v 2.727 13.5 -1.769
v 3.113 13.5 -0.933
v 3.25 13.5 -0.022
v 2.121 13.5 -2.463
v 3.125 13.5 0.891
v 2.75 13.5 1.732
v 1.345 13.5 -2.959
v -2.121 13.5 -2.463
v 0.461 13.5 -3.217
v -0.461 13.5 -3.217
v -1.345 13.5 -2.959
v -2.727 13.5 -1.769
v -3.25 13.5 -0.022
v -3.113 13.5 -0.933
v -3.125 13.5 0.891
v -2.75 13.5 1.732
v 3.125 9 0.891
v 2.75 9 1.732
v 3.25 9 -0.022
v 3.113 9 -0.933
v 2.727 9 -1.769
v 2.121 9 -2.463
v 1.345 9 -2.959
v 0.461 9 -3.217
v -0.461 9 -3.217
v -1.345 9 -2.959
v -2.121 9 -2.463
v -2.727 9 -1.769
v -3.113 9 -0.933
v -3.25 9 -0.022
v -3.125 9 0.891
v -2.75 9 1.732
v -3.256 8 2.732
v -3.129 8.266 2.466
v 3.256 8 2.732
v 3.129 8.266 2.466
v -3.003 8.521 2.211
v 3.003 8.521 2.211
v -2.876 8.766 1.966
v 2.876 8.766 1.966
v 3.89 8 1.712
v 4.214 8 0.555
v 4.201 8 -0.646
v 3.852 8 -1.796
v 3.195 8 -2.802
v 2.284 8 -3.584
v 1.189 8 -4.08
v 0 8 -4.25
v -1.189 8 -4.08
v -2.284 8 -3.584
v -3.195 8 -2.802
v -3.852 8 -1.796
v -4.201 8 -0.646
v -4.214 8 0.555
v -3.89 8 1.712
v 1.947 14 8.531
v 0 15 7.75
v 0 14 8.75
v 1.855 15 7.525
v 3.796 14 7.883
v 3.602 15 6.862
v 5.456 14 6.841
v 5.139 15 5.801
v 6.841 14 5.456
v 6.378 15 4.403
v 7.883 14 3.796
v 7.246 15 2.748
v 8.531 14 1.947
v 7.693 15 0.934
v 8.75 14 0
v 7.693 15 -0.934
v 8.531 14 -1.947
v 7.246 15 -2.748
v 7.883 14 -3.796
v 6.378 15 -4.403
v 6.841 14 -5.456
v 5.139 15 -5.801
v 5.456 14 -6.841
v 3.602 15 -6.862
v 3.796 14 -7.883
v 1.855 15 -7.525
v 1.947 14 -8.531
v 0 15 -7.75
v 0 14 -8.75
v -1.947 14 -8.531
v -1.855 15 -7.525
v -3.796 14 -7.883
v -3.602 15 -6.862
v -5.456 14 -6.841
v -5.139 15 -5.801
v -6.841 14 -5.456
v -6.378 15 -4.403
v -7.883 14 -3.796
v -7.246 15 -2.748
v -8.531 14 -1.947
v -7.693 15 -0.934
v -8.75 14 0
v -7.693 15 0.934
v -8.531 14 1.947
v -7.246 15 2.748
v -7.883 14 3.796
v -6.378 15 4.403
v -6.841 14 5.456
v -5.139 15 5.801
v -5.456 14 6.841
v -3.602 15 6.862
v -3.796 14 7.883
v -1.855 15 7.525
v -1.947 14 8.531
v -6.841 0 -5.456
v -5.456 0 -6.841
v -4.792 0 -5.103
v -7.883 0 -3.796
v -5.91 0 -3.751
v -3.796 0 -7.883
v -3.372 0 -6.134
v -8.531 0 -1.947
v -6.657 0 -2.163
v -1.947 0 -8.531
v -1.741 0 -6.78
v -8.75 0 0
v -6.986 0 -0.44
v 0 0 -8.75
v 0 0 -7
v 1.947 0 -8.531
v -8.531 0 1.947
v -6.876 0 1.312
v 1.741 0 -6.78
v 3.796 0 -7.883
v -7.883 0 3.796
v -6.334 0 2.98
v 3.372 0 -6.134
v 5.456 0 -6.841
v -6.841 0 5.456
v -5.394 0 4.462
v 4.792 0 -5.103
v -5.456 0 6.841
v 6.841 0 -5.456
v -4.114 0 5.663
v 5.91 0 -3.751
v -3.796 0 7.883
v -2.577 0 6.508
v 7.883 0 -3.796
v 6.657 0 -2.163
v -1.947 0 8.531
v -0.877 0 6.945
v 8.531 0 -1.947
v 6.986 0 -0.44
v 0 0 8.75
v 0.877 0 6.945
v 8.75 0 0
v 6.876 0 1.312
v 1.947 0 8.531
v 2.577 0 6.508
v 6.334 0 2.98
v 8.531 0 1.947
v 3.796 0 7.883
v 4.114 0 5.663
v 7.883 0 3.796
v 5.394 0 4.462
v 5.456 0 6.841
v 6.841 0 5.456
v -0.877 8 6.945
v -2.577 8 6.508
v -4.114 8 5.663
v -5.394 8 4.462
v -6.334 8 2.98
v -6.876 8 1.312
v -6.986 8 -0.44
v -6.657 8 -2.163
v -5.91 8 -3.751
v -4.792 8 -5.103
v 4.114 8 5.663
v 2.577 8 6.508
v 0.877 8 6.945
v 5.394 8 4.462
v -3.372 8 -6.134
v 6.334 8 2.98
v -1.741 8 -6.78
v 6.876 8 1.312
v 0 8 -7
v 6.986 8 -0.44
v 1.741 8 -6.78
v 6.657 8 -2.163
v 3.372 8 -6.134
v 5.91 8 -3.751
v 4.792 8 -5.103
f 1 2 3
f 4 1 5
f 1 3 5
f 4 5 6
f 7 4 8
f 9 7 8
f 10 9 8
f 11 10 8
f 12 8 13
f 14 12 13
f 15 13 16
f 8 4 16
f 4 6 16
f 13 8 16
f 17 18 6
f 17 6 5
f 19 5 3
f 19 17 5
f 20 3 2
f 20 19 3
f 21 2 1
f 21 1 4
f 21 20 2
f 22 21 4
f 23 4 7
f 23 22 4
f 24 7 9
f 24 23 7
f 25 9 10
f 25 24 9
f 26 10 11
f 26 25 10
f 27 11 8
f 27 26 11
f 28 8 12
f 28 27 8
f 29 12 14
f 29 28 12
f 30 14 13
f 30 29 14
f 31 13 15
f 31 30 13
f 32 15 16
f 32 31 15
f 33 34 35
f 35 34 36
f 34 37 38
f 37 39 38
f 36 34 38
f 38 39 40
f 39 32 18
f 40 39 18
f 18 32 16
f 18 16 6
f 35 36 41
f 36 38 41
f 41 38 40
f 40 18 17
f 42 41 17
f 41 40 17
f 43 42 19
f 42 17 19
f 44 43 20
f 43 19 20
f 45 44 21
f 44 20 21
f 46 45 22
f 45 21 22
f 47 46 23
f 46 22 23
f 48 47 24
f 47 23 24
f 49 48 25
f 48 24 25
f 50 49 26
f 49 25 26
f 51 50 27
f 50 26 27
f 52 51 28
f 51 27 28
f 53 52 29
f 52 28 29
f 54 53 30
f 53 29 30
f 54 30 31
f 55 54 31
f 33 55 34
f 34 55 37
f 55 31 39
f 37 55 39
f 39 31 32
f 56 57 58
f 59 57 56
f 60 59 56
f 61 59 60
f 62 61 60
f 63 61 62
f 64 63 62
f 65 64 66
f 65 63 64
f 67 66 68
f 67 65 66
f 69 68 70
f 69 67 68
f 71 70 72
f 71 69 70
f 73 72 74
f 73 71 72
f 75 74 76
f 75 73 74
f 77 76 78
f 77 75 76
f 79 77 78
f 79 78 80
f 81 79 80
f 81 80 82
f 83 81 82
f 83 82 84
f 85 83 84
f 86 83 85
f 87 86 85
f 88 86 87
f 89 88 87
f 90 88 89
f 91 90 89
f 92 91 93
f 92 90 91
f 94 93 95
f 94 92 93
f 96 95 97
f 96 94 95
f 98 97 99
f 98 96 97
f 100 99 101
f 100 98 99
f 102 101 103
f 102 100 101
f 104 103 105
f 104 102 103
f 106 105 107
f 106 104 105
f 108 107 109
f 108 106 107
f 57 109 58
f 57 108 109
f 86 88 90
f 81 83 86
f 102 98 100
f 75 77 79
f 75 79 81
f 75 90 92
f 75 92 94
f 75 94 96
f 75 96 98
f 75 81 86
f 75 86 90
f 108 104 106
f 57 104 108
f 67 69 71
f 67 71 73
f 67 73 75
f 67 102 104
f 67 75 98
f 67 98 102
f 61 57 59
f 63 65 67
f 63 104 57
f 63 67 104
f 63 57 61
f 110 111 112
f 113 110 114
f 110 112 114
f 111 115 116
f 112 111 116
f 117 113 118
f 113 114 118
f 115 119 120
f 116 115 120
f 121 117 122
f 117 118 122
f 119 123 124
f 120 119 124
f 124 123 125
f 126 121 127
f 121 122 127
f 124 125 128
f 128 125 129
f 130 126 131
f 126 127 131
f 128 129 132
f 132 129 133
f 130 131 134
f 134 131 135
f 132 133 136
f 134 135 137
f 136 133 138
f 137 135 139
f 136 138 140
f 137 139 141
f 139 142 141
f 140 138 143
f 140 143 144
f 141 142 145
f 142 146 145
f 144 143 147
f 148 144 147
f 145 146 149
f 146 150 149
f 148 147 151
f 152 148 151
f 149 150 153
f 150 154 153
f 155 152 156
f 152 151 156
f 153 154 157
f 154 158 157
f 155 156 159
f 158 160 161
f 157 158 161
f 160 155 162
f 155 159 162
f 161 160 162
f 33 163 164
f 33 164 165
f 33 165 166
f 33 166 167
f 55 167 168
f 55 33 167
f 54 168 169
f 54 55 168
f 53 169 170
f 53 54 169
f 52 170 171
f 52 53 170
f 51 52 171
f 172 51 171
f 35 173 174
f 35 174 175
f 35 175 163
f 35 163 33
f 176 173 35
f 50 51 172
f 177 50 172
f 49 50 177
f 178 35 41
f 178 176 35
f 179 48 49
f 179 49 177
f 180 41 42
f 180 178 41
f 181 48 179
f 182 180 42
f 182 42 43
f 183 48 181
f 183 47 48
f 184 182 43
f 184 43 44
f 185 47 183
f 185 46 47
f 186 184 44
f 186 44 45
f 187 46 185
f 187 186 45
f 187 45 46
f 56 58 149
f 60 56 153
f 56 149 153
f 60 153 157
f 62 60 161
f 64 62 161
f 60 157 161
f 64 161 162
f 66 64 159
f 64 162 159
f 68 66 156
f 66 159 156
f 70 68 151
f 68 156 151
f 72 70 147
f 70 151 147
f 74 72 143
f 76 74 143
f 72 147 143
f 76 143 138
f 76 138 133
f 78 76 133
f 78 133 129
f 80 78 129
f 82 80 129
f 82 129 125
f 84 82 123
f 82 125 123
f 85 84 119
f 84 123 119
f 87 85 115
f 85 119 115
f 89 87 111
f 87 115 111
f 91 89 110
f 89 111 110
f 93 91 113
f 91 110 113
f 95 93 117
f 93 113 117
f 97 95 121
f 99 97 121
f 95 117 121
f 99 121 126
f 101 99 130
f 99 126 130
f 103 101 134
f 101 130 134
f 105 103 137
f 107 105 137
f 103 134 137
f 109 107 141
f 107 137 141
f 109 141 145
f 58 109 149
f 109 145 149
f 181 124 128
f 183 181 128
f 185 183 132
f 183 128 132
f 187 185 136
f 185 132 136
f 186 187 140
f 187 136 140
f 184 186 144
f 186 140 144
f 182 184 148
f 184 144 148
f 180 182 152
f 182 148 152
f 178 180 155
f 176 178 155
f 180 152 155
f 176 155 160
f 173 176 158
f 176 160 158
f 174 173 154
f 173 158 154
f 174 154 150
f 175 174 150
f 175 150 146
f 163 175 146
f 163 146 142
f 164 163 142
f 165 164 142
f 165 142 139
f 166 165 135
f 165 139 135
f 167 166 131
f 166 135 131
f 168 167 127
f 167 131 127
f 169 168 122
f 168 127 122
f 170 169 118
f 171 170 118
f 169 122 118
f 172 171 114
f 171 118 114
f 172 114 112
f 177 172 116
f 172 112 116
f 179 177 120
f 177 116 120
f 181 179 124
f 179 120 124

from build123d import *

# Parameters (mm, degrees)
SKETCH1_R           = 8.75
BOSS_EXTRUDE1_DEPTH = 15
SKETCH2_R           = 7
CUT_EXTRUDE1_DEPTH  = 8
CUT_EXTRUDE2_DEPTH  = 5.5
CHAMFER1_SIZE       = 1
CHAMFER2_SIZE       = 1


with BuildPart() as part:
    # Sketch1 → Boss-Extrude1 (new body)
    with BuildSketch(Plane(origin=(0, 0, 0), x_dir=(1, 0, 0), z_dir=(0, 1, 0))):
        with Locations(Location((0, 0, 0), (0, 0, 270))):
            Circle(SKETCH1_R)
    extrude(amount=BOSS_EXTRUDE1_DEPTH)

    # Sketch2 → Cut-Extrude1 (cut)
    with BuildSketch(Plane.XZ):
        with Locations(Location((0, 0, 0), (0, 0, 270))):
            Circle(SKETCH2_R)
    extrude(amount=-CUT_EXTRUDE1_DEPTH, mode=Mode.SUBTRACT)

    # Sketch3 → Cut-Extrude2 (cut)
    with BuildSketch(Plane.XZ.offset(-8)):
        with BuildLine():
            Line((-2.75, 1.732050808), (2.75, 1.732050808))
            ThreePointArc((2.75, 1.732050808), (0, -3.25), (-2.75, 1.732050808))
        make_face()
    extrude(amount=-CUT_EXTRUDE2_DEPTH, mode=Mode.SUBTRACT)

    # Chamfer1
    chamfer1_edges = [part.edges().sort_by_distance(p)[0] for p in [
        (0, 15, -8.75),
    ]]
    chamfer(chamfer1_edges, length=CHAMFER1_SIZE)

    # Chamfer2
    chamfer2_edges = [part.edges().sort_by_distance(p)[0] for p in [
        (0, 8, -3.25),
        (0, 8, 1.732050808),
    ]]
    chamfer(chamfer2_edges, length=CHAMFER2_SIZE)


solid = part.part
